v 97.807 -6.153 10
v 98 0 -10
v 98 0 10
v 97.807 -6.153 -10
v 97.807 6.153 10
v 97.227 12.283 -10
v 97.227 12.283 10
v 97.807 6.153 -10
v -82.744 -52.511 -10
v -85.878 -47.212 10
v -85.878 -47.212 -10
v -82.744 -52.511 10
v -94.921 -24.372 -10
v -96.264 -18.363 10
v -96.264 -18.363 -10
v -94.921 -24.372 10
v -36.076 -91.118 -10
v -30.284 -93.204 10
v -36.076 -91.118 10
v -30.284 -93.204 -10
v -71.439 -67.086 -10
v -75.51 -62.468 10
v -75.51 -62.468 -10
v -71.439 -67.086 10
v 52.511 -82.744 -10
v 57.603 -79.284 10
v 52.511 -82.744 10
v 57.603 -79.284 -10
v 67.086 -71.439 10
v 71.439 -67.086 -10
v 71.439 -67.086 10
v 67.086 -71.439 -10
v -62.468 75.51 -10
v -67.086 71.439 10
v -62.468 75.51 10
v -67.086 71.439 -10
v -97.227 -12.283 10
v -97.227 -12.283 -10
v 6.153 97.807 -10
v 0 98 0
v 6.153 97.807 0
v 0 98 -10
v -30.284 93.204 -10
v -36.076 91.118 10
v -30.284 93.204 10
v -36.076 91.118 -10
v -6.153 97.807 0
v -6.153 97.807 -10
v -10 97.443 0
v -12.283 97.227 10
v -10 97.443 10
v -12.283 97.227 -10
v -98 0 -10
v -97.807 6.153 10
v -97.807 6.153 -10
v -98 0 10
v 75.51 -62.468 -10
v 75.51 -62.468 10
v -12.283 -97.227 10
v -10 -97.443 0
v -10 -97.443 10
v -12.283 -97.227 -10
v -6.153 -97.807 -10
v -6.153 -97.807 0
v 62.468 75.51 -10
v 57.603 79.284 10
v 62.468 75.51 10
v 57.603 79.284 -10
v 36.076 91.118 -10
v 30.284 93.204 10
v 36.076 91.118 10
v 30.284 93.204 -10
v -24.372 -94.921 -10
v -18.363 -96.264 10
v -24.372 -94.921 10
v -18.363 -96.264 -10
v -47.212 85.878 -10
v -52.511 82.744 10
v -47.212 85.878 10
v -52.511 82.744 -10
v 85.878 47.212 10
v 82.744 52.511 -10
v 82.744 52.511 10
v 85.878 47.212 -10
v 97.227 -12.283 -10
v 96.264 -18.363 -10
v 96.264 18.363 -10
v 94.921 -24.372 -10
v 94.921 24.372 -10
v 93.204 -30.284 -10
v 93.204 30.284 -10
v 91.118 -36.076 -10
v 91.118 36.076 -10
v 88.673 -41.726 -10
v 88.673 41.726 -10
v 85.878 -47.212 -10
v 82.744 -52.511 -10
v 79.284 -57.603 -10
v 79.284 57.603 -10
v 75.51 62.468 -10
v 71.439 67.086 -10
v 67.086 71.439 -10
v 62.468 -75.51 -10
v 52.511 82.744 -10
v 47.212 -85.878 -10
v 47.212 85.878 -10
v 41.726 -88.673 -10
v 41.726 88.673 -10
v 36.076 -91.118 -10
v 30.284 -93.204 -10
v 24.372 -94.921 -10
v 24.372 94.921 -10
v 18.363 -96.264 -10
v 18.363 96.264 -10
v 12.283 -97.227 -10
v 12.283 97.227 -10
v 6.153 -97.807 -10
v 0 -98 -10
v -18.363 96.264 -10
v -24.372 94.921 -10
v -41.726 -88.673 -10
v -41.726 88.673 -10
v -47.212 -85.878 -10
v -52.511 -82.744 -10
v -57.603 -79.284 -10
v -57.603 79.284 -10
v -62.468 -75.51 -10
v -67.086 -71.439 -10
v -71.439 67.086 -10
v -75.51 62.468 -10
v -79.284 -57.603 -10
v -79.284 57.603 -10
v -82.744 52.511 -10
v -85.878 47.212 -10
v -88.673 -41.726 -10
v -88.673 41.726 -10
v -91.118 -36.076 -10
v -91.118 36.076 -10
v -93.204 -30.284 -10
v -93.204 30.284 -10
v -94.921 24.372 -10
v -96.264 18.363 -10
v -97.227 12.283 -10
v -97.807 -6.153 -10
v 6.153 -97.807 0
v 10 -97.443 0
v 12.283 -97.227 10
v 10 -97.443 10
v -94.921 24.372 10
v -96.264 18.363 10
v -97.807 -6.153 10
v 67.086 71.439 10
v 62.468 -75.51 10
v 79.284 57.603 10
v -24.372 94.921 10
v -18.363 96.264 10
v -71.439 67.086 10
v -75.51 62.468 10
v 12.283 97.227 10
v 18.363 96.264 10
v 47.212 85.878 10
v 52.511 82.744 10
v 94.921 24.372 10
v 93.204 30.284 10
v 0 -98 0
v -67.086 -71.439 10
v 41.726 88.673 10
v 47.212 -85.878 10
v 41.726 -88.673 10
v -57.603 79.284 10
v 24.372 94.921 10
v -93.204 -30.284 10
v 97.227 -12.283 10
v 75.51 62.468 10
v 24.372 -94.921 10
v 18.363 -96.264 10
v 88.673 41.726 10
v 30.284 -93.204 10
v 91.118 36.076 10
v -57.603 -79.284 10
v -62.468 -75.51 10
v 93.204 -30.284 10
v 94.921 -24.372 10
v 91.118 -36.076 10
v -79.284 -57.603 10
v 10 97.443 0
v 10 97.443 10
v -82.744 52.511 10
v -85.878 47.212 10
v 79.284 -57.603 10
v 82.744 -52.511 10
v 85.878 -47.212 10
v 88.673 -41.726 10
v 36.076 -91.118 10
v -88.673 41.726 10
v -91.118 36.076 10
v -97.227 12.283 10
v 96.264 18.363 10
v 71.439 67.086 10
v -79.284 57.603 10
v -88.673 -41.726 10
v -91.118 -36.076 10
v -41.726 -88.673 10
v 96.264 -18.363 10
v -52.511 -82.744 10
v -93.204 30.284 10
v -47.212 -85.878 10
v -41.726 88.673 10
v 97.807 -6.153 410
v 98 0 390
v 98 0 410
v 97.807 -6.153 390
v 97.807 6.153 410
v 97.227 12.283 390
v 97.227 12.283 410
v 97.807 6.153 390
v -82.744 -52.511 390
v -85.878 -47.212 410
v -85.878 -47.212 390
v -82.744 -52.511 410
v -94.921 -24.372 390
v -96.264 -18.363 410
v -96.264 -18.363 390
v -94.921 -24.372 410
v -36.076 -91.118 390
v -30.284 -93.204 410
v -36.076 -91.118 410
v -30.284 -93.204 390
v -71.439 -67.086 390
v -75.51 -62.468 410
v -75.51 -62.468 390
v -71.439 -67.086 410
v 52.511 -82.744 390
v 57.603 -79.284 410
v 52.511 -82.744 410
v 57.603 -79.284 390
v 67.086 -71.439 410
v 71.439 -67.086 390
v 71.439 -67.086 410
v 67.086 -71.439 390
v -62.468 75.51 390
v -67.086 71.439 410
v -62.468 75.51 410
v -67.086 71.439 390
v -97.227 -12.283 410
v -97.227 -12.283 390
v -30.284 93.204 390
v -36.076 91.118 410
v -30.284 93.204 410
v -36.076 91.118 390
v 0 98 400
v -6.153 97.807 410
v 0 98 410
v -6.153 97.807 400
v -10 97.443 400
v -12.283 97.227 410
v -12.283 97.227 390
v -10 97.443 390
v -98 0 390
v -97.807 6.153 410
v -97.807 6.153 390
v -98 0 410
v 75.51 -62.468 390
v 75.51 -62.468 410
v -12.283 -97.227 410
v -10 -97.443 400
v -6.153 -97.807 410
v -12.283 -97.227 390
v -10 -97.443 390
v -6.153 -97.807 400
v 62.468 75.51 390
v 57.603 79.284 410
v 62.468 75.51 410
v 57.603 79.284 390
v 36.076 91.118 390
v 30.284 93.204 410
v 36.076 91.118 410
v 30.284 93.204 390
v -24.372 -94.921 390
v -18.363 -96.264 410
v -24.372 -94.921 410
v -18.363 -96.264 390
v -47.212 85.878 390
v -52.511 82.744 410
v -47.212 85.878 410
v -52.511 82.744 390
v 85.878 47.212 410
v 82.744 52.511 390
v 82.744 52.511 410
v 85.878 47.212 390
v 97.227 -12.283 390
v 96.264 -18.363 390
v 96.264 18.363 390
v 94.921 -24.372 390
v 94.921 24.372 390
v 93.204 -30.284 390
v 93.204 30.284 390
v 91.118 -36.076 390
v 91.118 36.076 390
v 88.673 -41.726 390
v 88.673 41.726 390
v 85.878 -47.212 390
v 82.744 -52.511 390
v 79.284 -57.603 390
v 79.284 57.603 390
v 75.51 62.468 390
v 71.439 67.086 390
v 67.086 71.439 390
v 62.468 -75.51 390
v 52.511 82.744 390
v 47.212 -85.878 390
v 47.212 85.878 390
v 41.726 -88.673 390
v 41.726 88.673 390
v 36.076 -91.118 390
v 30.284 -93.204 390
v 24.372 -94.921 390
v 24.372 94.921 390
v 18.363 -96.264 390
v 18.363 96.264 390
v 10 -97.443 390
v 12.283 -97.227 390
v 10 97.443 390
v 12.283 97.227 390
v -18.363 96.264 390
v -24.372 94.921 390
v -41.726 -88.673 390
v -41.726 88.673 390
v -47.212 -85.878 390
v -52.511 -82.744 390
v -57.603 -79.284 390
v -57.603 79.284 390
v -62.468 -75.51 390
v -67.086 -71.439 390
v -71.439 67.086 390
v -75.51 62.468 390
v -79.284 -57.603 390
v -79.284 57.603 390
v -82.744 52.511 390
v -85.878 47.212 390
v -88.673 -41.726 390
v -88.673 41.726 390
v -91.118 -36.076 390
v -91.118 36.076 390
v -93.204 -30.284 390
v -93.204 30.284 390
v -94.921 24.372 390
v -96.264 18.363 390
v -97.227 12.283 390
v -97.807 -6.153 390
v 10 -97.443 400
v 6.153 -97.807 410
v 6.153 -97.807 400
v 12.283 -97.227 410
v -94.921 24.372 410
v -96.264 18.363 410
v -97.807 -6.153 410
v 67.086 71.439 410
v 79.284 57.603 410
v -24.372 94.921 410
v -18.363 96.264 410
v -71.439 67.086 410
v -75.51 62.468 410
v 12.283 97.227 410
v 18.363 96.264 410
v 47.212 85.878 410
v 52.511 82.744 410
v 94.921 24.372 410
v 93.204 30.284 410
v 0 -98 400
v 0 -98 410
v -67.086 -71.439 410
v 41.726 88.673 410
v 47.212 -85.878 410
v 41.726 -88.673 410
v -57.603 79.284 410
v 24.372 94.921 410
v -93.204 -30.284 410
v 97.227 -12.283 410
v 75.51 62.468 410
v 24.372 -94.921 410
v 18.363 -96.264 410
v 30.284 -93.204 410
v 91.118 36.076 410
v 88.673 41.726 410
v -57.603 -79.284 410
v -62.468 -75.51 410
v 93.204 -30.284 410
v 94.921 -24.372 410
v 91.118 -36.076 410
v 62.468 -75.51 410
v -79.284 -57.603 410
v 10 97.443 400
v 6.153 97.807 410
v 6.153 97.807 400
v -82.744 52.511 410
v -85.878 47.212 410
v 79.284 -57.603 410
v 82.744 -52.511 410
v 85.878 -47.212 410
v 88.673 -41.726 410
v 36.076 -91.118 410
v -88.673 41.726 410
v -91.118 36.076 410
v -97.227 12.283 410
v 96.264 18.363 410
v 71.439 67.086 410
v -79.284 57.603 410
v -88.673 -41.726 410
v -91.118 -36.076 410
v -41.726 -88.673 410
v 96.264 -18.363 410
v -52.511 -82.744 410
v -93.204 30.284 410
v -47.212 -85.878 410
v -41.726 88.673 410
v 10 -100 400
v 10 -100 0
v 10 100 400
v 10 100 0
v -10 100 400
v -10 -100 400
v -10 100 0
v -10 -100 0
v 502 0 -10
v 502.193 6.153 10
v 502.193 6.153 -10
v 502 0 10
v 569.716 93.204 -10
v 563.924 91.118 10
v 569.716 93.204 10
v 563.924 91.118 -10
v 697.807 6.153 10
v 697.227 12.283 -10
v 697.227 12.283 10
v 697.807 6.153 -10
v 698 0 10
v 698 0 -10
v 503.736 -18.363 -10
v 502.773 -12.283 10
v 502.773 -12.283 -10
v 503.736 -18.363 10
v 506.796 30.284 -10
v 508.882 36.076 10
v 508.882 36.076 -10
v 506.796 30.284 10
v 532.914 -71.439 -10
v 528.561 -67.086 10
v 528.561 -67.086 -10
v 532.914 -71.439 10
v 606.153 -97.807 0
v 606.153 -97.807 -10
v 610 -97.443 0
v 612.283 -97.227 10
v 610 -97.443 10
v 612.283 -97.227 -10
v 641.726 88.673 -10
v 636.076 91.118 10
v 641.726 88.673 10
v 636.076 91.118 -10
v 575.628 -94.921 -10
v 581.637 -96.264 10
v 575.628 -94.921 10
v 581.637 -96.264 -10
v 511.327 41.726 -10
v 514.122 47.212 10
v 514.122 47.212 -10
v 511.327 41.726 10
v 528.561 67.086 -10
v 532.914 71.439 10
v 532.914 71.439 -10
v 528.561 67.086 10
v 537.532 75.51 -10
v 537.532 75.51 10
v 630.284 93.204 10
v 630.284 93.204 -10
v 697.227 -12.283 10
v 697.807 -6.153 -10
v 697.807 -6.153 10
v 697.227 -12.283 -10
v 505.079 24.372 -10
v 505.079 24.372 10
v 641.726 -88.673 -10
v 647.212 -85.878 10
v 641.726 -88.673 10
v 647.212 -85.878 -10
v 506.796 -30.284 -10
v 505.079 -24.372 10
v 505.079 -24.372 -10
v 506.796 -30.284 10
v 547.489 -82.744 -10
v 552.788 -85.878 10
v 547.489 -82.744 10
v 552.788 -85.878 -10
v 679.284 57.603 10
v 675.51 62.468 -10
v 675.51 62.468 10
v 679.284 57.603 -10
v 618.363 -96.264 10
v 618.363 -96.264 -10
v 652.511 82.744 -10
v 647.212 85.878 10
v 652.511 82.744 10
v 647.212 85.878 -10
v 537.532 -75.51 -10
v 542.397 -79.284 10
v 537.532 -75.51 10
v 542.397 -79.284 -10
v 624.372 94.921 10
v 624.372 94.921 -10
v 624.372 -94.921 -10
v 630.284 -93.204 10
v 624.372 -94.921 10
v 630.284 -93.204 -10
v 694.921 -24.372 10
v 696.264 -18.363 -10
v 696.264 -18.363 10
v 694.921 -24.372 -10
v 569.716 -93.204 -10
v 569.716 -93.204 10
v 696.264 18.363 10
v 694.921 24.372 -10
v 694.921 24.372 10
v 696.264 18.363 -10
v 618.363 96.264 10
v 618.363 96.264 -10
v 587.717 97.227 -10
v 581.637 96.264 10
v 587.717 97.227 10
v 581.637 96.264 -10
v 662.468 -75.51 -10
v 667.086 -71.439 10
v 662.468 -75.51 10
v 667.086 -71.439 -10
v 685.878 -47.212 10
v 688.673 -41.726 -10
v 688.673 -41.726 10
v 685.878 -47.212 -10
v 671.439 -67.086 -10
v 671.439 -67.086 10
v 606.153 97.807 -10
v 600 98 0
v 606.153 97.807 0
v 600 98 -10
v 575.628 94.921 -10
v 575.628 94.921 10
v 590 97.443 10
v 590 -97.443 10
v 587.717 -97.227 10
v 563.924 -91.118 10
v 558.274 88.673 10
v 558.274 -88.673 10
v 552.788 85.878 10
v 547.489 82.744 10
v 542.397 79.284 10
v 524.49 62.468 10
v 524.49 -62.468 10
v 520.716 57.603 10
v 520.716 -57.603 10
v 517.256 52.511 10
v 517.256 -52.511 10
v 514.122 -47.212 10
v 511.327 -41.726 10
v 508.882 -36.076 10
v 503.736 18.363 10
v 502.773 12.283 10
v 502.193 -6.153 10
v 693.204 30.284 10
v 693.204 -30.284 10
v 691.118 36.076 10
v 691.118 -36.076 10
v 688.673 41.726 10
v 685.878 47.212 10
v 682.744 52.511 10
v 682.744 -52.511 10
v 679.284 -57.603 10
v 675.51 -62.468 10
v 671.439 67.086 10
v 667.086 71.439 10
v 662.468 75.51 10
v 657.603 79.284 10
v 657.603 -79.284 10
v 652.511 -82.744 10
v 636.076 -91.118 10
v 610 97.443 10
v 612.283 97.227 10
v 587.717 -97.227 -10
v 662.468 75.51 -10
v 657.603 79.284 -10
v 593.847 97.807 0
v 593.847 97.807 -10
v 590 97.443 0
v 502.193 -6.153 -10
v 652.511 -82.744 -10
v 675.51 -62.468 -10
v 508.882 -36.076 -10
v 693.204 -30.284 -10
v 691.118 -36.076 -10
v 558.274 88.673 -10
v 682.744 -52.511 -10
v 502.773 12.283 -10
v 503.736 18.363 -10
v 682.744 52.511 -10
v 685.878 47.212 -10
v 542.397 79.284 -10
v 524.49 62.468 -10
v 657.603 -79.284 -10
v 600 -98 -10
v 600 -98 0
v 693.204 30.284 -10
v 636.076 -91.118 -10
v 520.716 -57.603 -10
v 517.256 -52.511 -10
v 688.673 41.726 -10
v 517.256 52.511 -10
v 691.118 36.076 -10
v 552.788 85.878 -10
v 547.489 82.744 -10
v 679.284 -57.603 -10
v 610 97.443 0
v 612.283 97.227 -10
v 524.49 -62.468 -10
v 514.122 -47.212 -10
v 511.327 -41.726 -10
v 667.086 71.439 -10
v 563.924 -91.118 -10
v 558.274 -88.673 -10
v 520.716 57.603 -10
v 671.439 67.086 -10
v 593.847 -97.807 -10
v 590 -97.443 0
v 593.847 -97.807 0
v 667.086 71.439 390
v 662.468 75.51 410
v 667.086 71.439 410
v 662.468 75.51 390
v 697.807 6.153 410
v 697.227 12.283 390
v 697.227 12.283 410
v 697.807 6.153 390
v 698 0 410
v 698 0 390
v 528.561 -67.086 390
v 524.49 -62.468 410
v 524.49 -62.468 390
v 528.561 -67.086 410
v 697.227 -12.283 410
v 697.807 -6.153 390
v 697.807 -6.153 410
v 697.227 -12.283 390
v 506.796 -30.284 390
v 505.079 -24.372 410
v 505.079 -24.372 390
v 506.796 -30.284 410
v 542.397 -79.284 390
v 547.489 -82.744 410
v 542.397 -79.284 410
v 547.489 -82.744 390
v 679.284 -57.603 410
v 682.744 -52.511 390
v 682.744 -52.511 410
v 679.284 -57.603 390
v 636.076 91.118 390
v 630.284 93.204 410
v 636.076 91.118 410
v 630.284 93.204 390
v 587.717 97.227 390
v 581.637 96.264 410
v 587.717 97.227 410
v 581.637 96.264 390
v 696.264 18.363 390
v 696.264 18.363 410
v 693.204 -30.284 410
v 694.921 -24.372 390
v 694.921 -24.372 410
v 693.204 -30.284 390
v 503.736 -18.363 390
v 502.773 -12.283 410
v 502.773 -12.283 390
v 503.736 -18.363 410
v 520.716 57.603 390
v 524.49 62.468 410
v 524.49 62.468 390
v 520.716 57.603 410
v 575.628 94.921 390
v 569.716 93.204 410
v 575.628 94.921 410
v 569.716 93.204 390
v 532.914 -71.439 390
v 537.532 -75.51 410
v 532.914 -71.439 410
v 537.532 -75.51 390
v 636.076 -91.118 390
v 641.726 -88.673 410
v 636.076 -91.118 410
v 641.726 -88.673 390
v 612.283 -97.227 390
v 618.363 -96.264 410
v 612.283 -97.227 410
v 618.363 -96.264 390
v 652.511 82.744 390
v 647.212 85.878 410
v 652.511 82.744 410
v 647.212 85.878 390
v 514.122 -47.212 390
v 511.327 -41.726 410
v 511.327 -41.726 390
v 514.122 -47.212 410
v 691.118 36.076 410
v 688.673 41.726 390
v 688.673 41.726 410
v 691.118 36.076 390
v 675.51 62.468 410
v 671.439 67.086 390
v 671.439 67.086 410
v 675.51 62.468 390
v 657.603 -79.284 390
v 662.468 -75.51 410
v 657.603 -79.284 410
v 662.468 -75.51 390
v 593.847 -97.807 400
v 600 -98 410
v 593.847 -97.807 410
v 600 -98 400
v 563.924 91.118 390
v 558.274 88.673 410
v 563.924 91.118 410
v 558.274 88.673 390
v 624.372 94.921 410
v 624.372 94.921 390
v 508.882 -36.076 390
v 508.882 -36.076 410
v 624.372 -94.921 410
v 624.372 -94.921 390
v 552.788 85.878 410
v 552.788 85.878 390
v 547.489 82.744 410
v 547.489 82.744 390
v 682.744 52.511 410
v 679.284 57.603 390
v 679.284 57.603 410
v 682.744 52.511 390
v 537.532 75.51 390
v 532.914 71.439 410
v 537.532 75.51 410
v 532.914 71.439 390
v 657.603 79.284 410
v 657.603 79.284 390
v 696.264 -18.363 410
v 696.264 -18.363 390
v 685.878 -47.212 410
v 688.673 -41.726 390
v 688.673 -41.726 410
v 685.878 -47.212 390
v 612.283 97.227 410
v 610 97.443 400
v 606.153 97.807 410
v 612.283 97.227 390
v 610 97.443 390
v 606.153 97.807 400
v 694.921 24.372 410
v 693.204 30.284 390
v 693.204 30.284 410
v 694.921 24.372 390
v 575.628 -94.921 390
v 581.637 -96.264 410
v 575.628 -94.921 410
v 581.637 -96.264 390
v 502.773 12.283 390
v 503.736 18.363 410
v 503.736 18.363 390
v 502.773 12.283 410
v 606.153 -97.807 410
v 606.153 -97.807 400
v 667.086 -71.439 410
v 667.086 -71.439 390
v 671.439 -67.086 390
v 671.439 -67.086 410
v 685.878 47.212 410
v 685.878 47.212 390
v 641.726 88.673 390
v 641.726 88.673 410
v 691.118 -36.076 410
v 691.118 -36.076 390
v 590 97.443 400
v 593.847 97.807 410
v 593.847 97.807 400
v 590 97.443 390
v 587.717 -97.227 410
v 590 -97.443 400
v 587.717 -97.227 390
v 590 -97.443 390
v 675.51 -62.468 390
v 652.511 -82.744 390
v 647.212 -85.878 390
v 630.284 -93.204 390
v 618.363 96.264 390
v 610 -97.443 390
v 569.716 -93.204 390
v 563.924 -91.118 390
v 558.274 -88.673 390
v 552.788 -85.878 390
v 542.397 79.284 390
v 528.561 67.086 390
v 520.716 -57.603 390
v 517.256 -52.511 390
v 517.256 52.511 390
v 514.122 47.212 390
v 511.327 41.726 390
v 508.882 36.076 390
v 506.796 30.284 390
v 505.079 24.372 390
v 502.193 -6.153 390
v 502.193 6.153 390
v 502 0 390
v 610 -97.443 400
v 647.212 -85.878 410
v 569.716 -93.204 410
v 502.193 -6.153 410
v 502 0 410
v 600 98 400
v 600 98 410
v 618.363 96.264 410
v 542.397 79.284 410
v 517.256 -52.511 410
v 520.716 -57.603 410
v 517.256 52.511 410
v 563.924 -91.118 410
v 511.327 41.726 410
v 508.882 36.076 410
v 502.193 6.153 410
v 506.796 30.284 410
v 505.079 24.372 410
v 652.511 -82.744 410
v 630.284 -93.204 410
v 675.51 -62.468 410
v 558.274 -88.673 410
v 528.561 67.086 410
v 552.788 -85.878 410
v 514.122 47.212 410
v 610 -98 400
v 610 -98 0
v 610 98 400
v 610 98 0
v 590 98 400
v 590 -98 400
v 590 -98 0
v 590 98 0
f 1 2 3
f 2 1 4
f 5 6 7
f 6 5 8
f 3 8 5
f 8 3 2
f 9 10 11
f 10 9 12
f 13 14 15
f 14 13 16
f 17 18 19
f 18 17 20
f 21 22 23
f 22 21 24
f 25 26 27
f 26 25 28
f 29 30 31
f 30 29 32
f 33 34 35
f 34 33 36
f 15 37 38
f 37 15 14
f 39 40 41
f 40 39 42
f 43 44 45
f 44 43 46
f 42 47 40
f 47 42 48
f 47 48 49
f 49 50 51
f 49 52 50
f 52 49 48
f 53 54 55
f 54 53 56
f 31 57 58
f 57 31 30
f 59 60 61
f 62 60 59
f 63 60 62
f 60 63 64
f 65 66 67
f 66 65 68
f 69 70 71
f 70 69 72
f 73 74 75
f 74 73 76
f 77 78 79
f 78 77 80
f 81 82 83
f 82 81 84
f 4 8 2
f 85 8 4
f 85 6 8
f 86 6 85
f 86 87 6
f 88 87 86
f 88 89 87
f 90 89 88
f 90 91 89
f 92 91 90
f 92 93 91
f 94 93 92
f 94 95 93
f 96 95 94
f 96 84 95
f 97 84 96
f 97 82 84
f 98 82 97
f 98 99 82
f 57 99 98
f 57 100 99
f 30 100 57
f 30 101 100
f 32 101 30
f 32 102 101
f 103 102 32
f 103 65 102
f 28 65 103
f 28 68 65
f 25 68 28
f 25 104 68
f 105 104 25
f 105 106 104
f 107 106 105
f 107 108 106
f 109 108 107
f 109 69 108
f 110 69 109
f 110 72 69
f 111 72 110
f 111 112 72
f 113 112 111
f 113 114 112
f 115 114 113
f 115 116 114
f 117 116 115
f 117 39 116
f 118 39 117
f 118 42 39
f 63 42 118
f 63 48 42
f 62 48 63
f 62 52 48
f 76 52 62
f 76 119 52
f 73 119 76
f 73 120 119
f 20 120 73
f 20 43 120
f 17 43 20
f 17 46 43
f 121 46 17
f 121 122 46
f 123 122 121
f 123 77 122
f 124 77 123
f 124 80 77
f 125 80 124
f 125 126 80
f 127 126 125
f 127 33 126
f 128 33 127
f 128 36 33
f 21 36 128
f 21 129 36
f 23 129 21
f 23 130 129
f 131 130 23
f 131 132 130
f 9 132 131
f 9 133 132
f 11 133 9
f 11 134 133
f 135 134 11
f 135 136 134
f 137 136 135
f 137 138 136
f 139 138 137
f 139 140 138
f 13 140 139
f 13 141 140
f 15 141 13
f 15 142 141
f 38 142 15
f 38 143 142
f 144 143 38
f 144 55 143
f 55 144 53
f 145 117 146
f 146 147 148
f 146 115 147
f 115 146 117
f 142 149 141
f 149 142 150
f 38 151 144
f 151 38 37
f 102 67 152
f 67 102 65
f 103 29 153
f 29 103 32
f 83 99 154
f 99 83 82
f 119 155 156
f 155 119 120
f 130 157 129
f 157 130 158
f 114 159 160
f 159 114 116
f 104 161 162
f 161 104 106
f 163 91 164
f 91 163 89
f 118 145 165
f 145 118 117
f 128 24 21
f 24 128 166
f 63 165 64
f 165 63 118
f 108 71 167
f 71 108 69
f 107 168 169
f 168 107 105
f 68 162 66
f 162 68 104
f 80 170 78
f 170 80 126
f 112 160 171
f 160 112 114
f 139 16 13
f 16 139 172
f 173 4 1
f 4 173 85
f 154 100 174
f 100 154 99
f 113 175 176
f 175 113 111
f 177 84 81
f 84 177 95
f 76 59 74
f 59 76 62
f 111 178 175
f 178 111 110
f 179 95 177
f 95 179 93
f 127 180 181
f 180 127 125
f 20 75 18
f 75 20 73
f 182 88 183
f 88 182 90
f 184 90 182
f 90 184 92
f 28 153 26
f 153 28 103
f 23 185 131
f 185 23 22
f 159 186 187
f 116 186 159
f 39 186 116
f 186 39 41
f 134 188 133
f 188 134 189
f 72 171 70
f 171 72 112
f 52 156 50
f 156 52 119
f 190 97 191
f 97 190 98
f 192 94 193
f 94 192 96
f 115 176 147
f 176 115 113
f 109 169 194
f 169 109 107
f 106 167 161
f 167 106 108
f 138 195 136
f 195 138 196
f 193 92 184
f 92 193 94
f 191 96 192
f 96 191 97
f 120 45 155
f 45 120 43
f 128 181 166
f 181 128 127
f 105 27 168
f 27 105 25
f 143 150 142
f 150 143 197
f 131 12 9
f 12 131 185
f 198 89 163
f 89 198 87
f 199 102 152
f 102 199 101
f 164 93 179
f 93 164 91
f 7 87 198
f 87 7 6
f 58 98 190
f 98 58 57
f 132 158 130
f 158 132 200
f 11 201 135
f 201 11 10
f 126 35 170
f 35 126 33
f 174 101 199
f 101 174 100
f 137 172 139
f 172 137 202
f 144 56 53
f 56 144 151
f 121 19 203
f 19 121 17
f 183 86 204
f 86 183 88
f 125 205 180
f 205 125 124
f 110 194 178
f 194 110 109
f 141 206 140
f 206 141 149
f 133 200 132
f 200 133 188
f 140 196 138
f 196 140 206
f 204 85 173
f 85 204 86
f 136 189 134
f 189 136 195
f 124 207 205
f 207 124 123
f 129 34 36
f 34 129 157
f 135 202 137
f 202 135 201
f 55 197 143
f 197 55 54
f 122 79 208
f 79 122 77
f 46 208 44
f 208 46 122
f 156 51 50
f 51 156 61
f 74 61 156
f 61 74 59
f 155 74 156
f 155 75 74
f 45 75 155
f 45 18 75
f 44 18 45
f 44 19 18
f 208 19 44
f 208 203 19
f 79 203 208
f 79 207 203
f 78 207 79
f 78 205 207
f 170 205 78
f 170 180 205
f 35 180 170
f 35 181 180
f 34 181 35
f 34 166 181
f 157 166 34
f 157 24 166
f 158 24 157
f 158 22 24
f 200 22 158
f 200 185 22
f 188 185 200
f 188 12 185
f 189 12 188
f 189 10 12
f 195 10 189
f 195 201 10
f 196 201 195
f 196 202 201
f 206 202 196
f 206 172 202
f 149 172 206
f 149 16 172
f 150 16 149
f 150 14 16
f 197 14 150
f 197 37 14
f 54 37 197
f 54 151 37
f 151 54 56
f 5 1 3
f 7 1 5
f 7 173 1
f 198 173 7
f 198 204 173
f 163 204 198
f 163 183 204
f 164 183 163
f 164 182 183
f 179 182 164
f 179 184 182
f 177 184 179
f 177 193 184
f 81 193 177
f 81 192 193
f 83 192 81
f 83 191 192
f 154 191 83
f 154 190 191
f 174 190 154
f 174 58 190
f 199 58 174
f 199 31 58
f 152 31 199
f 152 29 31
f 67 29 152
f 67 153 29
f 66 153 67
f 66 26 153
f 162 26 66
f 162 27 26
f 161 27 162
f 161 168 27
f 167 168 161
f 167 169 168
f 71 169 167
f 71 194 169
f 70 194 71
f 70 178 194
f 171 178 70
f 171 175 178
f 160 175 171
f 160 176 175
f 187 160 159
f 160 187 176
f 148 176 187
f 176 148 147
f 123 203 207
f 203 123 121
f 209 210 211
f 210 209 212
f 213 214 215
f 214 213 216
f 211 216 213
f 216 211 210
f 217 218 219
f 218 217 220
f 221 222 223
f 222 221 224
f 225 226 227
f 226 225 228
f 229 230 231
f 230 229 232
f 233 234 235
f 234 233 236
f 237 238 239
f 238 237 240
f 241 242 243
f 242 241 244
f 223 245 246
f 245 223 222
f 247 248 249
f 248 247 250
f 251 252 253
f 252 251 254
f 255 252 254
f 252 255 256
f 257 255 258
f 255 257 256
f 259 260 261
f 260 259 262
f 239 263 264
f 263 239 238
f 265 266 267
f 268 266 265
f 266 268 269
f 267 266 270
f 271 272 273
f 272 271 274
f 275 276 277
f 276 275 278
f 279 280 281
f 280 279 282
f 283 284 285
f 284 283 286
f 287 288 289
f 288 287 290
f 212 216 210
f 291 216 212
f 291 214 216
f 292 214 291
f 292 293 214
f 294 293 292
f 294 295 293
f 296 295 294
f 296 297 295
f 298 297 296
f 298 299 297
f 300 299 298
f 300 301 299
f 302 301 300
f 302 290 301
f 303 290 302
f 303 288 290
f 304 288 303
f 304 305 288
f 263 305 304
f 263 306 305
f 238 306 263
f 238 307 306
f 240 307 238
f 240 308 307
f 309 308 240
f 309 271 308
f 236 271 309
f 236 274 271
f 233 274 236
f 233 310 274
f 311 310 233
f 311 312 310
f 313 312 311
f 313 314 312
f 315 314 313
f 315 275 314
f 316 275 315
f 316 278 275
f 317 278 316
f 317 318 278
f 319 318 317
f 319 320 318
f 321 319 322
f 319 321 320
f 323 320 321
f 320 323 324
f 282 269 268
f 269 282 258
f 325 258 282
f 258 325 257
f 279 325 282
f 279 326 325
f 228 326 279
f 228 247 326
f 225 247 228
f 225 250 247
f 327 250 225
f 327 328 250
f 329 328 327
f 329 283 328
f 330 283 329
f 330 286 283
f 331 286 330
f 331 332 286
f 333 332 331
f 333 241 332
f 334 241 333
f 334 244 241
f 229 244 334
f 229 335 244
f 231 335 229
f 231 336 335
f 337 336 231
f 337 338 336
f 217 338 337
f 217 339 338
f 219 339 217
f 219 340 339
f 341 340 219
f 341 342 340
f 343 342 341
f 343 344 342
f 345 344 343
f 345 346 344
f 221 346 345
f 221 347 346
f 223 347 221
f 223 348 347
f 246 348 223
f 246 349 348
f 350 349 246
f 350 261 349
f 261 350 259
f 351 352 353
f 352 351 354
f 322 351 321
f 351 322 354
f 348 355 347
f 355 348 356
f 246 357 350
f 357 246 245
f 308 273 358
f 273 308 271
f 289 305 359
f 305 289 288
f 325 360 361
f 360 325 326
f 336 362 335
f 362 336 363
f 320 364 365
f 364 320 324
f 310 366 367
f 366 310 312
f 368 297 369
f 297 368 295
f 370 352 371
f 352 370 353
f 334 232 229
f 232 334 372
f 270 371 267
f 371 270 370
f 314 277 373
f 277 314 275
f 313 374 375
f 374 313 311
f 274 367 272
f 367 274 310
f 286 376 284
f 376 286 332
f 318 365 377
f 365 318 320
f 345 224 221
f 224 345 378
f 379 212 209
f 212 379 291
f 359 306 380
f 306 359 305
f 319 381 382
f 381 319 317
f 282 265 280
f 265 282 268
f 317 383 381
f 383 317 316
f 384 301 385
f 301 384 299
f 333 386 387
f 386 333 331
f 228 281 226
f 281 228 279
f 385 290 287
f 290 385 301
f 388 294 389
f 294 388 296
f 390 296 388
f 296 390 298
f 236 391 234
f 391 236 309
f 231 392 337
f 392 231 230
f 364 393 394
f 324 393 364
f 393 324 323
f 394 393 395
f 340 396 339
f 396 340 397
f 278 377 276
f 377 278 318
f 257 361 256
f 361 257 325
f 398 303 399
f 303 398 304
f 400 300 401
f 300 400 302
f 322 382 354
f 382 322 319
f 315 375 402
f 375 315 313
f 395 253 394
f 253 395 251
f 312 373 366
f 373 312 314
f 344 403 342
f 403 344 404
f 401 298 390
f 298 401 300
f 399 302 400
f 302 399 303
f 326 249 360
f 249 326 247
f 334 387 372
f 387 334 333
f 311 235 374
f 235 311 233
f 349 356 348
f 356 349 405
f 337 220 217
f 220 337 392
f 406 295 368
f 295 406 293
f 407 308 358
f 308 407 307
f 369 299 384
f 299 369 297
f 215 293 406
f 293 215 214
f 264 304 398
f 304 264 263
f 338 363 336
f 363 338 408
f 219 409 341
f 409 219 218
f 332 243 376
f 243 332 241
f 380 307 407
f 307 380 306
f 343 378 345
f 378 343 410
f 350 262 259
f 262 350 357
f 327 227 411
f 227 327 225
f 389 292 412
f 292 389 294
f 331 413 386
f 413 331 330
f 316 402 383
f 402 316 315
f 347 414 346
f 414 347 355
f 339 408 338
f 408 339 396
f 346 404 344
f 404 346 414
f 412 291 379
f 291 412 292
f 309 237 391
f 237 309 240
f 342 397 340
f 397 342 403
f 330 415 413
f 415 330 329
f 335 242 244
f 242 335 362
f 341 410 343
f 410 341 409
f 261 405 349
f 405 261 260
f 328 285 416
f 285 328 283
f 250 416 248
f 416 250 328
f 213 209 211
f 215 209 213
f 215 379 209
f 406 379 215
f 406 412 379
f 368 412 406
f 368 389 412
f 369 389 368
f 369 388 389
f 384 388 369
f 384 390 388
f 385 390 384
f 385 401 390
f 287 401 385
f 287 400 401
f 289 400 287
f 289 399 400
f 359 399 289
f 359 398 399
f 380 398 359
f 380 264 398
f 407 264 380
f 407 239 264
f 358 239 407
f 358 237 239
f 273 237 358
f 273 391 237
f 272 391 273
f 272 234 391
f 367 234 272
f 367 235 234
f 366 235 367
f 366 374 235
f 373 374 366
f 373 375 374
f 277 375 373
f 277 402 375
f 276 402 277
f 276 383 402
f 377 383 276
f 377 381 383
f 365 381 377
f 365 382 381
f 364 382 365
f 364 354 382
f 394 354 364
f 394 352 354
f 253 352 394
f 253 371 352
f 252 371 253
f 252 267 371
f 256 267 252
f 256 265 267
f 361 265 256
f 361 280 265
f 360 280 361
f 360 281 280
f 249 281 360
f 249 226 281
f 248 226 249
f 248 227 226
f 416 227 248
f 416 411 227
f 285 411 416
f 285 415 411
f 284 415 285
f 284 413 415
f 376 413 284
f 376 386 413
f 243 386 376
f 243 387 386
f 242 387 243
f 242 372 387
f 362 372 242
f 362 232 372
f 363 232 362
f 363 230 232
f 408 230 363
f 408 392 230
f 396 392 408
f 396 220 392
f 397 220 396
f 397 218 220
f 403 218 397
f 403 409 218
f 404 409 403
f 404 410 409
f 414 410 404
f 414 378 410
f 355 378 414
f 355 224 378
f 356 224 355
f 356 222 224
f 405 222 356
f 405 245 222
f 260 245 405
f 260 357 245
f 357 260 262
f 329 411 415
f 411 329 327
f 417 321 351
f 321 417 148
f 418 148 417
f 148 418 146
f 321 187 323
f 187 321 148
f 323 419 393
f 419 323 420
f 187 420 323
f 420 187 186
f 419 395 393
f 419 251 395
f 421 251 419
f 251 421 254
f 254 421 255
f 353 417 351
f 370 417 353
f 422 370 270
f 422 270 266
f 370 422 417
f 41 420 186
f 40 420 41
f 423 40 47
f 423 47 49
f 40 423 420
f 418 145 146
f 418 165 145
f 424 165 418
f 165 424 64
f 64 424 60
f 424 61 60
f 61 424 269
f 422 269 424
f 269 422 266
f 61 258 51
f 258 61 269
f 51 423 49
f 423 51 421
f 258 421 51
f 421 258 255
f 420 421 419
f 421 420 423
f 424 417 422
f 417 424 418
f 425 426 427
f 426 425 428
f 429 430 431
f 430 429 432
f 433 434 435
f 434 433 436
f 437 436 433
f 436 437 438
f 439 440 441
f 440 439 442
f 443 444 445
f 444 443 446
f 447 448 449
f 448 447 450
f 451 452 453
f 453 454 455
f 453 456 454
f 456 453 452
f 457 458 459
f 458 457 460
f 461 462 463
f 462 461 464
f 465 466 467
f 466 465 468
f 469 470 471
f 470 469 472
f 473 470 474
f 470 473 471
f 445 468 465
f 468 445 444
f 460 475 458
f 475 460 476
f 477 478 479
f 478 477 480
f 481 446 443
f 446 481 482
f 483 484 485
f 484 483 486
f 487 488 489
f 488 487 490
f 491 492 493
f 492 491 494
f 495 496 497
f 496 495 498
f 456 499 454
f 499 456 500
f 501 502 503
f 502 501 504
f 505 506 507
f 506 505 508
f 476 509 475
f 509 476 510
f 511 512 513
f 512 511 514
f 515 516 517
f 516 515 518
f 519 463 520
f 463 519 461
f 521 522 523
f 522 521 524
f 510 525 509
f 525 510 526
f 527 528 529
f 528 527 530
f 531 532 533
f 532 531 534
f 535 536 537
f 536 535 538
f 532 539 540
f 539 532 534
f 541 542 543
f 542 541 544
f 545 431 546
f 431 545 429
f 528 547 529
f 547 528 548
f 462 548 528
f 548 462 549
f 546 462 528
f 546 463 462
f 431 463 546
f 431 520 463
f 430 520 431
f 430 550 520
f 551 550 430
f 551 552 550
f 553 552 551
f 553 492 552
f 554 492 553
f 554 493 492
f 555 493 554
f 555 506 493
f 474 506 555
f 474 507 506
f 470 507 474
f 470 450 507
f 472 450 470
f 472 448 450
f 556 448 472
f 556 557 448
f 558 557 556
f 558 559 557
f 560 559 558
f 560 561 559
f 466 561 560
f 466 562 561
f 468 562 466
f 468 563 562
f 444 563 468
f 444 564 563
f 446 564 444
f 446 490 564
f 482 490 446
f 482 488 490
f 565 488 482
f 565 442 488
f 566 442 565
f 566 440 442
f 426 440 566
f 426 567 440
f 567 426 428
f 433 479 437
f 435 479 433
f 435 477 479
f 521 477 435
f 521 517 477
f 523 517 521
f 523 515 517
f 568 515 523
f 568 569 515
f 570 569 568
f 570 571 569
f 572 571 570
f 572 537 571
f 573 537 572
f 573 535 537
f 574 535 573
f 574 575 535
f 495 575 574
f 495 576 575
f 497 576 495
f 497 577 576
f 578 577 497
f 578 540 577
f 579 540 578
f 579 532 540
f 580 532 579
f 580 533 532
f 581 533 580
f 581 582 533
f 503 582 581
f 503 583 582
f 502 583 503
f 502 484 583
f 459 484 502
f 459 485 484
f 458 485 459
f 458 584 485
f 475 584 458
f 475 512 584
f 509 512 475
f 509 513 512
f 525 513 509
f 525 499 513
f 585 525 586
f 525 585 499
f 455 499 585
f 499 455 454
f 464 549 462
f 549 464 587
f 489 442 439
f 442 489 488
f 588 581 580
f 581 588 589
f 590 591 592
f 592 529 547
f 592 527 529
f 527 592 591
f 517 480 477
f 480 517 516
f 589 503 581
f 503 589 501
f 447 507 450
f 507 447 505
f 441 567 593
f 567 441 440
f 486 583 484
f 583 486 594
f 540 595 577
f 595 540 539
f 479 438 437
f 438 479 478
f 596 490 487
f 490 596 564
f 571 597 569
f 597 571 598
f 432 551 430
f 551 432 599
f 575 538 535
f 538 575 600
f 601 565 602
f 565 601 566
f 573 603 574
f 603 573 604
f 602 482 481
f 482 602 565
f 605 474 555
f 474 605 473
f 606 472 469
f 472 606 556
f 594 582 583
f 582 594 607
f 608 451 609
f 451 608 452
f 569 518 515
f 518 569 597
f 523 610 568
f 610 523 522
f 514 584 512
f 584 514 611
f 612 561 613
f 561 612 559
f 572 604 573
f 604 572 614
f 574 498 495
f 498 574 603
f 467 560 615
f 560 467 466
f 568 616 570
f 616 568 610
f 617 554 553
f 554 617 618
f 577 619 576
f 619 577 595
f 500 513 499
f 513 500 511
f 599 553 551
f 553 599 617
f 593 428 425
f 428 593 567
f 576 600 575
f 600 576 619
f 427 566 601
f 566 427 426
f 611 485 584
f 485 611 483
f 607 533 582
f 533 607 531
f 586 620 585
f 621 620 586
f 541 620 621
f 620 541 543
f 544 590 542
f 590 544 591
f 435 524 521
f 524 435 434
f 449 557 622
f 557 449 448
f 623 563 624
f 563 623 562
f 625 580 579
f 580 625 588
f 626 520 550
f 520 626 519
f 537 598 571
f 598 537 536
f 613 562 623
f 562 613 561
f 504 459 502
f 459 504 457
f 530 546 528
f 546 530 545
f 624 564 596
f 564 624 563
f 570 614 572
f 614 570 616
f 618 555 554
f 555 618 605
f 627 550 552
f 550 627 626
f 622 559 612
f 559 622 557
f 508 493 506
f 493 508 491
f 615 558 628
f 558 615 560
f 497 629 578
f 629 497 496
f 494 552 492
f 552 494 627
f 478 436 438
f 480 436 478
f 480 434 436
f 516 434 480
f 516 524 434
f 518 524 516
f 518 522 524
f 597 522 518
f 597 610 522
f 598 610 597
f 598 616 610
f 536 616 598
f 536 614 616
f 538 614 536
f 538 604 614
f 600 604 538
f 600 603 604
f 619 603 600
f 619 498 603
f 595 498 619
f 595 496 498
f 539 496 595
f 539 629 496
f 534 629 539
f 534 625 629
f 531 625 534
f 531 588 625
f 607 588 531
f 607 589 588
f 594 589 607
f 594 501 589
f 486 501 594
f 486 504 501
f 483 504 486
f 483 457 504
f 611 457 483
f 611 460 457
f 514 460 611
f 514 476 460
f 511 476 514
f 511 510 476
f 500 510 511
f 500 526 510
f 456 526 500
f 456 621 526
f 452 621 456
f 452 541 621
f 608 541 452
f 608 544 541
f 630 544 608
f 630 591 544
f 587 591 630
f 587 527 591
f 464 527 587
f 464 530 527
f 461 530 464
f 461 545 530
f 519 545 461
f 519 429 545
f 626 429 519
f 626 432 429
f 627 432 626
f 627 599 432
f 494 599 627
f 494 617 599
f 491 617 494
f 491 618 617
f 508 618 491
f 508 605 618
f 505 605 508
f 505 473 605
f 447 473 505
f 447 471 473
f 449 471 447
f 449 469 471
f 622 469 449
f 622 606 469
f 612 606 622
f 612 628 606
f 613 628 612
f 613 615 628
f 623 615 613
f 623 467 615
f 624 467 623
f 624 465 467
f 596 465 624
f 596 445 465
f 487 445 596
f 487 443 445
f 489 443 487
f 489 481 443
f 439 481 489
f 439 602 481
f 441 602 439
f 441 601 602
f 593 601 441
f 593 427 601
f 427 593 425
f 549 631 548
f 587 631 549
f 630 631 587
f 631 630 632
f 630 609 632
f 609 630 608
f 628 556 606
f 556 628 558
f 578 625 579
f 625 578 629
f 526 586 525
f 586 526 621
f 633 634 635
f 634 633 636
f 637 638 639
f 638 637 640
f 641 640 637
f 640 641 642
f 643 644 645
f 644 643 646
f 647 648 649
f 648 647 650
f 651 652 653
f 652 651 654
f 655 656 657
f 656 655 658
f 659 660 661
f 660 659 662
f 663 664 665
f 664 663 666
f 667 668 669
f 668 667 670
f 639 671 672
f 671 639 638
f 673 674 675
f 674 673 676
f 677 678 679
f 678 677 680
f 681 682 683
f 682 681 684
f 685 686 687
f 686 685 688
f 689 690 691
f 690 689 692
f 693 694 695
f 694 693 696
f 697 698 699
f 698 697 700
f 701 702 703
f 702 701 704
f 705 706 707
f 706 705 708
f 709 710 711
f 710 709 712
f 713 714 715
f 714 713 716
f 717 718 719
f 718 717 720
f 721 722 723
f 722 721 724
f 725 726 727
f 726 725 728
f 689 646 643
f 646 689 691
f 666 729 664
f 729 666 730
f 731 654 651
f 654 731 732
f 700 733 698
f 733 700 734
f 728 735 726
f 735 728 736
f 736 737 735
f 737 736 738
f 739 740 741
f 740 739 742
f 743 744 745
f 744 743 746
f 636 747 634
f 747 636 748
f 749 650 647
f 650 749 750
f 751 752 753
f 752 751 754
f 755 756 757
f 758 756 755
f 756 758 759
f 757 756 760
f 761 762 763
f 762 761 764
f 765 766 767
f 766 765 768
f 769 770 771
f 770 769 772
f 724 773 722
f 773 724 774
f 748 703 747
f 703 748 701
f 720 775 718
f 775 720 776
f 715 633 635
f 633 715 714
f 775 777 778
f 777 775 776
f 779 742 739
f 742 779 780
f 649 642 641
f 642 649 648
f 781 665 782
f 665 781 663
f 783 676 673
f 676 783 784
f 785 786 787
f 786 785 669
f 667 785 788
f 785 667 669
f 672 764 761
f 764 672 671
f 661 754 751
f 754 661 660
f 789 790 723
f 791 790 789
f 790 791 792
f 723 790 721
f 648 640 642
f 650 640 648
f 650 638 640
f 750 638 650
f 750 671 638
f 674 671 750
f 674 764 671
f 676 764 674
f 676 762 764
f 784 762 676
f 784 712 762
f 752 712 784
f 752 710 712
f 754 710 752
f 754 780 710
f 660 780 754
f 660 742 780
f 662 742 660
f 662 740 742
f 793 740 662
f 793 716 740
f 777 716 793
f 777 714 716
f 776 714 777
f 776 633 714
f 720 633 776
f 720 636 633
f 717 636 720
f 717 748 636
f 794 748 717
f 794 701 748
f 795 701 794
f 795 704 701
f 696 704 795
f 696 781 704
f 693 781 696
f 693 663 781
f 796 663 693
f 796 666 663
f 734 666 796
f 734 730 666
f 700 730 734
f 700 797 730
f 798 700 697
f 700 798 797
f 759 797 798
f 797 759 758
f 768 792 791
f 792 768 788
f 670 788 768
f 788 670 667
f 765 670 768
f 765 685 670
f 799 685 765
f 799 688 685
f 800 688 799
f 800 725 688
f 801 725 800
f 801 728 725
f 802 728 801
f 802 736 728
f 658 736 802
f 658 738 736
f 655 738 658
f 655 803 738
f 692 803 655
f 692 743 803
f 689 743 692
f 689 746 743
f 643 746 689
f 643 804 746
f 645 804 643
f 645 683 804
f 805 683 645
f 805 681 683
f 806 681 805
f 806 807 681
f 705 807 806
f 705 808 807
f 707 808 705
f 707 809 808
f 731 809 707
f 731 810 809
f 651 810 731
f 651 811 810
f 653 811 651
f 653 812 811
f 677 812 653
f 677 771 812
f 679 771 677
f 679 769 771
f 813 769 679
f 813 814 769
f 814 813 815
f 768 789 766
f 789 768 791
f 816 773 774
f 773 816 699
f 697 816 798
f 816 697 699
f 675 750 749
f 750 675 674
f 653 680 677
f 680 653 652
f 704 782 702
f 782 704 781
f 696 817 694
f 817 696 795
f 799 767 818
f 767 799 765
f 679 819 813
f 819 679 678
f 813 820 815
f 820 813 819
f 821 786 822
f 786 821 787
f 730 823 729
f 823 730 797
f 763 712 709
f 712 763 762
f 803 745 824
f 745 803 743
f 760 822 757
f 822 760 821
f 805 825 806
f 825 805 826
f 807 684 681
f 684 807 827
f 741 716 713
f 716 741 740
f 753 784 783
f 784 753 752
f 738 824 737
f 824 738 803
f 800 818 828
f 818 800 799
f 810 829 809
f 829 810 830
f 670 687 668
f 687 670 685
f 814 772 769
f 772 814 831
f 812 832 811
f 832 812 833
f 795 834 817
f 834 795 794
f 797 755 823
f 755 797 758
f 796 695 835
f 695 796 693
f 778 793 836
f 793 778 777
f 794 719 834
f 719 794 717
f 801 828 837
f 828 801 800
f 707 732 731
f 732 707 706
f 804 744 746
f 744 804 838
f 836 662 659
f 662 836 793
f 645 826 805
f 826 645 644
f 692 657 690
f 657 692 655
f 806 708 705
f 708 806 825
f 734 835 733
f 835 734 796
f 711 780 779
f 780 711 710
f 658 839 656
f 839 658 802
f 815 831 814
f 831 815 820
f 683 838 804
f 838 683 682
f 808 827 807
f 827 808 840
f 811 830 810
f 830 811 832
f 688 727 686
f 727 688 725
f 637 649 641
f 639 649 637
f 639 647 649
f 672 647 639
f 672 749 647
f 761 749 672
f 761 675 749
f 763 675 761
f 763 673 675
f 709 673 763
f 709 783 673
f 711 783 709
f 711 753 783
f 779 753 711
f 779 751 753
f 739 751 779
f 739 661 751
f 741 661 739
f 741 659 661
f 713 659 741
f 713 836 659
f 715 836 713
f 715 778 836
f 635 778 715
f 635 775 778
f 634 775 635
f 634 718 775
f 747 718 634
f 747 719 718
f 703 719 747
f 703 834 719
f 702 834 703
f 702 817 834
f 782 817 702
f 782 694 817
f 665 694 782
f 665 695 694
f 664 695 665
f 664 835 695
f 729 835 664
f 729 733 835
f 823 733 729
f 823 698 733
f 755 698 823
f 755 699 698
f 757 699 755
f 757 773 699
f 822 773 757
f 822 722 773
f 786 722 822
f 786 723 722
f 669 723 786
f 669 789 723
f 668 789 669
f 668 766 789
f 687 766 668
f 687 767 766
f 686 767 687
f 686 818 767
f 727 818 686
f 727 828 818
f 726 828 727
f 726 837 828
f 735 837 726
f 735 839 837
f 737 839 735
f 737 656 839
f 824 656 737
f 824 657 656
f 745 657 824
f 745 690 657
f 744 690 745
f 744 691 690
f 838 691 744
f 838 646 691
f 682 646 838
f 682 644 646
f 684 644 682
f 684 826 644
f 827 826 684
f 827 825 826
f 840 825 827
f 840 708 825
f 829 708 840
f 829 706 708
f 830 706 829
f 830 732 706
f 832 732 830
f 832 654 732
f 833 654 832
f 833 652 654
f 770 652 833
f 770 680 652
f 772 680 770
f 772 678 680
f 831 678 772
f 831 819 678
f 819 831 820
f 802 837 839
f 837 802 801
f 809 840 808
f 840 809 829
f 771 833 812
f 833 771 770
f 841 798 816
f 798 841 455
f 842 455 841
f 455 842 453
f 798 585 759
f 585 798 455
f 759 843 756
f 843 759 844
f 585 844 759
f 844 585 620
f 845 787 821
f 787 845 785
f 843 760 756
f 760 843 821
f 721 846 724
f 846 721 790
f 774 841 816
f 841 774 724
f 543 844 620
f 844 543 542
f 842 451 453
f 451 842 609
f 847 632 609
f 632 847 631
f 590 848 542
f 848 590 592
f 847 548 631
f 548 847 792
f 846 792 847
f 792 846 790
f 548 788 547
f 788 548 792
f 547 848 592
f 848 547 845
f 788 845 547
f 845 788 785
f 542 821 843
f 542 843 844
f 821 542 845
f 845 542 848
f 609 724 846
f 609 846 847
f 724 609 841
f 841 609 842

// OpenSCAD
// création support minuterie 
// diamètre fusex = 100mm dont 2mm d'épaisseur soit 98mm de diamètre intérieur
color ("white")
cylinder (h=20,r1=98,r2=98,center = true,$fn=100);
color ("white")
translate ([0,0,400])
          cylinder(h=20,r1=98,r2=98, center = true,$fn=100);
color ("white")
translate([0,0,200])
         cube([20,200,400], true,$fn=100);
         
// création 2ème support minuterie
color ("white")
translate ([600,0,0])
         cylinder (h=20,r1=98,r2=98,center = true,$fn=100);
color ("white")
translate ([600,0,400])
          cylinder(h=20,r1=98,r2=98, center = true,$fn=100);
color ("white")
translate([600,0,200])
         cube([20,196,400], true,$fn=100);
